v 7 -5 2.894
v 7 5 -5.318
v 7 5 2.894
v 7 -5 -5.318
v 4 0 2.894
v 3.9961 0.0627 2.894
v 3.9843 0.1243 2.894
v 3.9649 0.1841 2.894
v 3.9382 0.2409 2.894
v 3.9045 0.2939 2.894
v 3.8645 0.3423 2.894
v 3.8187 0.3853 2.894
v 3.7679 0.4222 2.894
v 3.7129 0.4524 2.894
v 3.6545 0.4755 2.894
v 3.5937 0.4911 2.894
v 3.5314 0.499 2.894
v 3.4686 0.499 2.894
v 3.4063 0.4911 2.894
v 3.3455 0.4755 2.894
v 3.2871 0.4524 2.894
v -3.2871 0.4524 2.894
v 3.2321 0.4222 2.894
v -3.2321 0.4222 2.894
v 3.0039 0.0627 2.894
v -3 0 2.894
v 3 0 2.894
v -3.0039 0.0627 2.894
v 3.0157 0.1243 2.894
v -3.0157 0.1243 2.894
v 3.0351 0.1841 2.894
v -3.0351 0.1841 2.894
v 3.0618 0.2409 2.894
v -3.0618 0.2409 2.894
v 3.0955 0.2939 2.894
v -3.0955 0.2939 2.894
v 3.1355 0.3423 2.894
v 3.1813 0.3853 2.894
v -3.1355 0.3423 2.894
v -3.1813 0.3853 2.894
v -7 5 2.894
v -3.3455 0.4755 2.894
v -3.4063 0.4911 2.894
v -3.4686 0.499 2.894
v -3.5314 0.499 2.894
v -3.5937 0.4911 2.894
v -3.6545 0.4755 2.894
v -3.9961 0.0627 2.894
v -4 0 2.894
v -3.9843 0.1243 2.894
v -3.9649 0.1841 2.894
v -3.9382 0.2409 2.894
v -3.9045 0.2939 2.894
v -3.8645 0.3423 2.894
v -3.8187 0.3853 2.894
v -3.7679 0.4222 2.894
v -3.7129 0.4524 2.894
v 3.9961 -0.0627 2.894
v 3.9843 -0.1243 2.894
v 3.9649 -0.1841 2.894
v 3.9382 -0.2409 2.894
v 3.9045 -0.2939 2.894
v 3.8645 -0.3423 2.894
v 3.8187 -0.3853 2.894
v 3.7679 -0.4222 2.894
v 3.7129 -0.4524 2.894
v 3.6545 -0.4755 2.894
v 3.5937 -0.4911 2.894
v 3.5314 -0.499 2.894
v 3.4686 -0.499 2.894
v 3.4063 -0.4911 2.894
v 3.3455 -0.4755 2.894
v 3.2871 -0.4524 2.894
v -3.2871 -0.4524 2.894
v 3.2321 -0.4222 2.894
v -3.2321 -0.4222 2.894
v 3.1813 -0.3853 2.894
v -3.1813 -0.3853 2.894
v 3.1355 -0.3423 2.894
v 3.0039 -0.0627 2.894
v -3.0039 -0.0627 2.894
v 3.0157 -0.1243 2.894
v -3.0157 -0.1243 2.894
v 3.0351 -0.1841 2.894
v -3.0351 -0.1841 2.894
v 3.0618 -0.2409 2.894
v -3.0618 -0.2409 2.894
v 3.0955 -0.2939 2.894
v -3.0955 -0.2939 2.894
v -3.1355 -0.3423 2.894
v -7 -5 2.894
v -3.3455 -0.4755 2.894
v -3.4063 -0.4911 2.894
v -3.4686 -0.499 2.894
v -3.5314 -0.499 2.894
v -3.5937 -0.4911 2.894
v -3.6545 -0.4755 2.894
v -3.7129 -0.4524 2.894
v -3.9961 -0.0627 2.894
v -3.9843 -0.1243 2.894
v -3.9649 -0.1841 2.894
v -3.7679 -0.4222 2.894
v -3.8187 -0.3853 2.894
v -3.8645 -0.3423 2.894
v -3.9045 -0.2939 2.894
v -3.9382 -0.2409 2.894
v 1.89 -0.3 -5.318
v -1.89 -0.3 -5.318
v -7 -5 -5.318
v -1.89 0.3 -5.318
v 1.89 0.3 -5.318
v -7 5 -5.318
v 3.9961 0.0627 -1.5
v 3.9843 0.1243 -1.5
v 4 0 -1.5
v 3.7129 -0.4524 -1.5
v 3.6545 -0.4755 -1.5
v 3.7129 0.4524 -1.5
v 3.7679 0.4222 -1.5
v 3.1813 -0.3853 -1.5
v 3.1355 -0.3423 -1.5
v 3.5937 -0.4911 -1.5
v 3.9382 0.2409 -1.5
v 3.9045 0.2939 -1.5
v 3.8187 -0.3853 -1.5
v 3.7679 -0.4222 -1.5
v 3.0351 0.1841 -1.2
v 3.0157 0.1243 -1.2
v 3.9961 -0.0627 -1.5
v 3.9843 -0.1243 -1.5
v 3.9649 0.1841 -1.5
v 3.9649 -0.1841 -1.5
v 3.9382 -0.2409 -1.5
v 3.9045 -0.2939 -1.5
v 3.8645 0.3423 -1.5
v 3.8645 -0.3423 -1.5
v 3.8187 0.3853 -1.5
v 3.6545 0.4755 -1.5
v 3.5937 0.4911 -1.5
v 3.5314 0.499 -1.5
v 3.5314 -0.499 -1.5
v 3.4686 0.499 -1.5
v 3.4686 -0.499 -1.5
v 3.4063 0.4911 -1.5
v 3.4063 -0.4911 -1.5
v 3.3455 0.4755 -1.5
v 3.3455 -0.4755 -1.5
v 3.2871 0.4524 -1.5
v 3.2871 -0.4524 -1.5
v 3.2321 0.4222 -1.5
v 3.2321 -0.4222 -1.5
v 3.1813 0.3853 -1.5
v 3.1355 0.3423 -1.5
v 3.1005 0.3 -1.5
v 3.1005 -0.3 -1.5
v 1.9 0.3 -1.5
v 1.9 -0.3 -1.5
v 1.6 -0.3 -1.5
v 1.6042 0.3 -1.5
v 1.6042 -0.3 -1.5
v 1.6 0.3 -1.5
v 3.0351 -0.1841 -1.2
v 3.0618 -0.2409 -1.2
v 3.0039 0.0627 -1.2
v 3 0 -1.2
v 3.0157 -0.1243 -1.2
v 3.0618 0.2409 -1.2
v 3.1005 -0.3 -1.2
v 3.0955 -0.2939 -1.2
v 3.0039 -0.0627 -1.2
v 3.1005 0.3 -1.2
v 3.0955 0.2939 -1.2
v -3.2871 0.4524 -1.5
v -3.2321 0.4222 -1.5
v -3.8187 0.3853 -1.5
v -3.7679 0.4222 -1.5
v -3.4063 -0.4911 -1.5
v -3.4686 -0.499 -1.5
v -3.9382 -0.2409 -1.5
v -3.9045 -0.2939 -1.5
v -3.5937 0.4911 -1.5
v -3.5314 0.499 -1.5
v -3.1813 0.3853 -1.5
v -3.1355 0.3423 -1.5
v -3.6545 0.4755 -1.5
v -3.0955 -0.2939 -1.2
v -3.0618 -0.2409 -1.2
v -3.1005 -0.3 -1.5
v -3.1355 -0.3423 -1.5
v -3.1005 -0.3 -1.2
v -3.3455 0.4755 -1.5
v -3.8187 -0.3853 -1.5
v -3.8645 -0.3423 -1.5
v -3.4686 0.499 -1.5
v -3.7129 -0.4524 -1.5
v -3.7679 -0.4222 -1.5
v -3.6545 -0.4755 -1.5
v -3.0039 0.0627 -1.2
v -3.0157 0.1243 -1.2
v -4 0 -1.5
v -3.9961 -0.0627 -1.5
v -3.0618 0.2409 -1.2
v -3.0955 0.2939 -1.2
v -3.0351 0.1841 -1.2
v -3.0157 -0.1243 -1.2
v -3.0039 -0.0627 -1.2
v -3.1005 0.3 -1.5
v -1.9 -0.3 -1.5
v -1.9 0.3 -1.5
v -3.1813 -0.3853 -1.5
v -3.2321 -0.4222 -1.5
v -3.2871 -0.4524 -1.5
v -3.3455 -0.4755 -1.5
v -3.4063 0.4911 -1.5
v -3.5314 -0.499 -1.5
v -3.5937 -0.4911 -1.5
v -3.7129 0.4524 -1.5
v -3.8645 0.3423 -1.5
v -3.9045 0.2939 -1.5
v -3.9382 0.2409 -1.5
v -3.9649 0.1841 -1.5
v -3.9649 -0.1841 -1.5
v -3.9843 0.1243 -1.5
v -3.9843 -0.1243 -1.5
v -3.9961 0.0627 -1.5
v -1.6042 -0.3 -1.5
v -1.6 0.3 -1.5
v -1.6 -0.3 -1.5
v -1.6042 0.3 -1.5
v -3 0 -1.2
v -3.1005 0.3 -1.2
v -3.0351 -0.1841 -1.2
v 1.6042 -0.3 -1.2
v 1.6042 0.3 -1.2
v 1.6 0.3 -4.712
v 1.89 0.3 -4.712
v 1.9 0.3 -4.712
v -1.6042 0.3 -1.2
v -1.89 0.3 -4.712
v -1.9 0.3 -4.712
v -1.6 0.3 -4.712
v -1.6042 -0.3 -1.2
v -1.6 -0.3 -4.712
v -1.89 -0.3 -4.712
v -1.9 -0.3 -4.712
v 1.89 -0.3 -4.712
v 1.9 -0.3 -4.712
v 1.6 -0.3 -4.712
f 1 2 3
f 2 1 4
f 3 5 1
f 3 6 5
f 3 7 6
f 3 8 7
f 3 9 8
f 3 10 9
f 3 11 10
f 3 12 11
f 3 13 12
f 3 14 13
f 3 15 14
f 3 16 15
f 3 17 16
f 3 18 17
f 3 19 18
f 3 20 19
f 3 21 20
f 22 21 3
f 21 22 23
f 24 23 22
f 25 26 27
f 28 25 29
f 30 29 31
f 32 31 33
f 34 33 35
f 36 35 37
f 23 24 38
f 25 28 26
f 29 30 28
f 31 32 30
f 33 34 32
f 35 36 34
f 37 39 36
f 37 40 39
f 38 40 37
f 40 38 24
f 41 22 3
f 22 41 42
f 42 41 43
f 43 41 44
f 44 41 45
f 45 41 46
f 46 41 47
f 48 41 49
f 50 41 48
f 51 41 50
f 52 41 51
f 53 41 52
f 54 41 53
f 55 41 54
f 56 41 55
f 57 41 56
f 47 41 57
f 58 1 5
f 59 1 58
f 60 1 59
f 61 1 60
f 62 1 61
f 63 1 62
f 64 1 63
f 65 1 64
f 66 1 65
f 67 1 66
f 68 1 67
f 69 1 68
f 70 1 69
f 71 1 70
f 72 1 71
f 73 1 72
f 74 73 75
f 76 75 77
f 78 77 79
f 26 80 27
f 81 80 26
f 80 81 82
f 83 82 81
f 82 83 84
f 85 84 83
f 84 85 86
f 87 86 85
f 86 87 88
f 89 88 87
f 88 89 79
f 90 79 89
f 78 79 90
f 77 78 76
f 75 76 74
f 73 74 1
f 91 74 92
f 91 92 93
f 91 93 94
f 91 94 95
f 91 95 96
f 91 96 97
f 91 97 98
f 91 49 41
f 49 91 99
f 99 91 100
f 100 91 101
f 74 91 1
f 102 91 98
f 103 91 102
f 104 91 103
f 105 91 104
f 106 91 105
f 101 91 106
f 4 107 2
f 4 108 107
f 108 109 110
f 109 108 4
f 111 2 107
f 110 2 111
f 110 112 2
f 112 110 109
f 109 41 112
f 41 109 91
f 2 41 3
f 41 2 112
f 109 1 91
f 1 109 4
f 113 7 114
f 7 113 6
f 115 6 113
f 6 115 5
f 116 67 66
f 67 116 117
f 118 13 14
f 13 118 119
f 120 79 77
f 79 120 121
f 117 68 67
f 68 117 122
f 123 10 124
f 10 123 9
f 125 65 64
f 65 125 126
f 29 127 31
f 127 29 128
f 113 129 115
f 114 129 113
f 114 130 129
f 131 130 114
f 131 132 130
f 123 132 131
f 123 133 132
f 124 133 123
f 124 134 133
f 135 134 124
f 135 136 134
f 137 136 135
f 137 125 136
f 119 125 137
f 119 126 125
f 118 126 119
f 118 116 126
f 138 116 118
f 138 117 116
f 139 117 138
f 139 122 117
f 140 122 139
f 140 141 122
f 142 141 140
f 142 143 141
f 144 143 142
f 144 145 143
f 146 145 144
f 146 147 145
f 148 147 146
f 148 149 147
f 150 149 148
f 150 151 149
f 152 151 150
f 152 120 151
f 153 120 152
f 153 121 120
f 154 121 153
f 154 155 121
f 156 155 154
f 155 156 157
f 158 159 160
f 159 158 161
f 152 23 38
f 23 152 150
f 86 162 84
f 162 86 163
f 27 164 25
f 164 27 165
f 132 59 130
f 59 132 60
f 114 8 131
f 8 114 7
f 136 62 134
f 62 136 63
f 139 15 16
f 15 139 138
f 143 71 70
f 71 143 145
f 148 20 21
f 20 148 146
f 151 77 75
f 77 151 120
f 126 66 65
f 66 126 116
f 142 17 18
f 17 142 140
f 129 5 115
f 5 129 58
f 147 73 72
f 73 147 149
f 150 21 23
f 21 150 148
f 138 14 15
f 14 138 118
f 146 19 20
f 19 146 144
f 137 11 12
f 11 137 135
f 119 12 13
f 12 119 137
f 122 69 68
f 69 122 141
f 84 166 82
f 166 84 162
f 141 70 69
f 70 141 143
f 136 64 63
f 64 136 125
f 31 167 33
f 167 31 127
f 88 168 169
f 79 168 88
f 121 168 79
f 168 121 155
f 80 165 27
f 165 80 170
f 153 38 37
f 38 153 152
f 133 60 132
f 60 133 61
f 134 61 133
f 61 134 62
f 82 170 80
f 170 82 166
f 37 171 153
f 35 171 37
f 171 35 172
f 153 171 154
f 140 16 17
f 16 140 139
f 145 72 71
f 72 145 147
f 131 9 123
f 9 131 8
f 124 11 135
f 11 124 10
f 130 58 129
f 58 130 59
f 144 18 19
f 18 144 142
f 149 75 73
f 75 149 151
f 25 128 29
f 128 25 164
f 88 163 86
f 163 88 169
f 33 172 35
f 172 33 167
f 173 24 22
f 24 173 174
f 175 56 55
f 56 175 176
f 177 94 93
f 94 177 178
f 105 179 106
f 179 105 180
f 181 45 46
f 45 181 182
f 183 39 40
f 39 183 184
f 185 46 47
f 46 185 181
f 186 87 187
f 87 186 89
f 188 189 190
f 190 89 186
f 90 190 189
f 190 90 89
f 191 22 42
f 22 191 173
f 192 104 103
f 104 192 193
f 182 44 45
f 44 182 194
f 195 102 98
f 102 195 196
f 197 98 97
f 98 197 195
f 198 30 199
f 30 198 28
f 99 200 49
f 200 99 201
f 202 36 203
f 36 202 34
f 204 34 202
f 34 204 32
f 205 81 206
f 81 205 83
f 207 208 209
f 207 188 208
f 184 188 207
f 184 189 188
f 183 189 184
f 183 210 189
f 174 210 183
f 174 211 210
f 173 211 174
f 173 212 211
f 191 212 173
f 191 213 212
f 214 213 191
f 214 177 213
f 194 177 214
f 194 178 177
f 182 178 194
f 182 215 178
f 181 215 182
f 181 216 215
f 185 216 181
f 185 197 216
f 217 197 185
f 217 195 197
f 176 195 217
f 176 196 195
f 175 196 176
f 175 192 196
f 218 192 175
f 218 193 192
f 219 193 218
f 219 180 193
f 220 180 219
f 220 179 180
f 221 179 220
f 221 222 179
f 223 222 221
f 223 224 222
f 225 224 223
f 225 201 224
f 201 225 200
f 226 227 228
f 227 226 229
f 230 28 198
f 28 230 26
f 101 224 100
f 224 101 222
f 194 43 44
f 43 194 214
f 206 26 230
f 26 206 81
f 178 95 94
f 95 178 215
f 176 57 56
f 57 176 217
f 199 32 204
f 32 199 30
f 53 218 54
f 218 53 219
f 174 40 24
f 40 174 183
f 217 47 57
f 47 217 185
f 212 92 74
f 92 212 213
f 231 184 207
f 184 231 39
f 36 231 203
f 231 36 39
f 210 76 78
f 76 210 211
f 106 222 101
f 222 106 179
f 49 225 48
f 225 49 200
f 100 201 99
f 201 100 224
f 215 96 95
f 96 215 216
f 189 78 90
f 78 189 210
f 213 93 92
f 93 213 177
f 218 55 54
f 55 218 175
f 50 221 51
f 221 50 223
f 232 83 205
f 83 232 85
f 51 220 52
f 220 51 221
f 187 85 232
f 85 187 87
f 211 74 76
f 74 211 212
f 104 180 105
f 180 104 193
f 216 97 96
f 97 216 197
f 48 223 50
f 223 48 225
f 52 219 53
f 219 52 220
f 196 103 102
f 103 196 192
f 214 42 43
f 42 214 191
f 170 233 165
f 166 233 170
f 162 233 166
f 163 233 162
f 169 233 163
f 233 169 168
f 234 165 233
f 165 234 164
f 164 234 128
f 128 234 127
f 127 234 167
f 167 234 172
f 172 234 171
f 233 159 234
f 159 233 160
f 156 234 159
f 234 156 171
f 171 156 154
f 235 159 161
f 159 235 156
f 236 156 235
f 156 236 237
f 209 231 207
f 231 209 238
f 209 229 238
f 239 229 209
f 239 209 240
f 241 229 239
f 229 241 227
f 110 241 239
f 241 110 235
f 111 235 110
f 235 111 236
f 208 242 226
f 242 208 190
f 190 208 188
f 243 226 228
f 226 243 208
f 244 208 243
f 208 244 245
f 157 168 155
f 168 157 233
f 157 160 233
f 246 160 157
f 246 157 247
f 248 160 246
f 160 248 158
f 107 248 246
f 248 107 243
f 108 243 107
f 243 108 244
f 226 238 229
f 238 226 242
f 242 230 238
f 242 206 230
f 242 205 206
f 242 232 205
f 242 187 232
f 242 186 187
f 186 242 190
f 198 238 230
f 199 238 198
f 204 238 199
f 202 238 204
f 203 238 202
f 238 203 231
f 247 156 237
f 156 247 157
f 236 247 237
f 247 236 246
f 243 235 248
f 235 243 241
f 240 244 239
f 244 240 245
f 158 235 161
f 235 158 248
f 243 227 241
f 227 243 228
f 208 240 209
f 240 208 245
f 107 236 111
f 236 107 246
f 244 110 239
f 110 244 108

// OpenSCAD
module mrMicro(){
	//block dimensions (use for shifting)
	slice=.101; // set this to whatever slice height you are doing
	base=12*slice;
	x=14;
	y=10;
	z=7+base;
	depth=5; 
	difference(){
		translate([0,0,-base])cube([x,y,z], center =true);
		//translate([-x/2,0,0])cube([x,y,z], center =true);
		translate([.25*x,0,1])cylinder(r=.5,h=depth,$fn=50,center=true);
		translate([-.25*x,0,1])cylinder(r=.5,h=depth,$fn=50,center=true);
		translate([x/4-(x/16),0,-1.5+.15])cube([x/8+x/48,.6,.3],center=true);
		translate([(x/4-x/16),0,-1.5+.15])cube([x/8+x/48,.6,.3],center=true);
		translate([-(x/4-x/16),0,-1.5+.15])cube([x/8+x/48,.6,.3],center=true);
		translate([x*.125,0,-2.5-base/2])cube([.3,.6,z-depth],center=true);
		translate([-x*.125,0,-2.5-base/2])cube([.3,.6,z-depth],center=true);
		translate([0,0,-z/2+.15-base])cube([x*.27,.6,.3],center=true);
		translate([0,0,-base-z/2])cube([x*.27,.6,base],center=true); //added to put hole in base layer
	}
	
	



} mrMicro();

//translate([])cube([])center=true;
